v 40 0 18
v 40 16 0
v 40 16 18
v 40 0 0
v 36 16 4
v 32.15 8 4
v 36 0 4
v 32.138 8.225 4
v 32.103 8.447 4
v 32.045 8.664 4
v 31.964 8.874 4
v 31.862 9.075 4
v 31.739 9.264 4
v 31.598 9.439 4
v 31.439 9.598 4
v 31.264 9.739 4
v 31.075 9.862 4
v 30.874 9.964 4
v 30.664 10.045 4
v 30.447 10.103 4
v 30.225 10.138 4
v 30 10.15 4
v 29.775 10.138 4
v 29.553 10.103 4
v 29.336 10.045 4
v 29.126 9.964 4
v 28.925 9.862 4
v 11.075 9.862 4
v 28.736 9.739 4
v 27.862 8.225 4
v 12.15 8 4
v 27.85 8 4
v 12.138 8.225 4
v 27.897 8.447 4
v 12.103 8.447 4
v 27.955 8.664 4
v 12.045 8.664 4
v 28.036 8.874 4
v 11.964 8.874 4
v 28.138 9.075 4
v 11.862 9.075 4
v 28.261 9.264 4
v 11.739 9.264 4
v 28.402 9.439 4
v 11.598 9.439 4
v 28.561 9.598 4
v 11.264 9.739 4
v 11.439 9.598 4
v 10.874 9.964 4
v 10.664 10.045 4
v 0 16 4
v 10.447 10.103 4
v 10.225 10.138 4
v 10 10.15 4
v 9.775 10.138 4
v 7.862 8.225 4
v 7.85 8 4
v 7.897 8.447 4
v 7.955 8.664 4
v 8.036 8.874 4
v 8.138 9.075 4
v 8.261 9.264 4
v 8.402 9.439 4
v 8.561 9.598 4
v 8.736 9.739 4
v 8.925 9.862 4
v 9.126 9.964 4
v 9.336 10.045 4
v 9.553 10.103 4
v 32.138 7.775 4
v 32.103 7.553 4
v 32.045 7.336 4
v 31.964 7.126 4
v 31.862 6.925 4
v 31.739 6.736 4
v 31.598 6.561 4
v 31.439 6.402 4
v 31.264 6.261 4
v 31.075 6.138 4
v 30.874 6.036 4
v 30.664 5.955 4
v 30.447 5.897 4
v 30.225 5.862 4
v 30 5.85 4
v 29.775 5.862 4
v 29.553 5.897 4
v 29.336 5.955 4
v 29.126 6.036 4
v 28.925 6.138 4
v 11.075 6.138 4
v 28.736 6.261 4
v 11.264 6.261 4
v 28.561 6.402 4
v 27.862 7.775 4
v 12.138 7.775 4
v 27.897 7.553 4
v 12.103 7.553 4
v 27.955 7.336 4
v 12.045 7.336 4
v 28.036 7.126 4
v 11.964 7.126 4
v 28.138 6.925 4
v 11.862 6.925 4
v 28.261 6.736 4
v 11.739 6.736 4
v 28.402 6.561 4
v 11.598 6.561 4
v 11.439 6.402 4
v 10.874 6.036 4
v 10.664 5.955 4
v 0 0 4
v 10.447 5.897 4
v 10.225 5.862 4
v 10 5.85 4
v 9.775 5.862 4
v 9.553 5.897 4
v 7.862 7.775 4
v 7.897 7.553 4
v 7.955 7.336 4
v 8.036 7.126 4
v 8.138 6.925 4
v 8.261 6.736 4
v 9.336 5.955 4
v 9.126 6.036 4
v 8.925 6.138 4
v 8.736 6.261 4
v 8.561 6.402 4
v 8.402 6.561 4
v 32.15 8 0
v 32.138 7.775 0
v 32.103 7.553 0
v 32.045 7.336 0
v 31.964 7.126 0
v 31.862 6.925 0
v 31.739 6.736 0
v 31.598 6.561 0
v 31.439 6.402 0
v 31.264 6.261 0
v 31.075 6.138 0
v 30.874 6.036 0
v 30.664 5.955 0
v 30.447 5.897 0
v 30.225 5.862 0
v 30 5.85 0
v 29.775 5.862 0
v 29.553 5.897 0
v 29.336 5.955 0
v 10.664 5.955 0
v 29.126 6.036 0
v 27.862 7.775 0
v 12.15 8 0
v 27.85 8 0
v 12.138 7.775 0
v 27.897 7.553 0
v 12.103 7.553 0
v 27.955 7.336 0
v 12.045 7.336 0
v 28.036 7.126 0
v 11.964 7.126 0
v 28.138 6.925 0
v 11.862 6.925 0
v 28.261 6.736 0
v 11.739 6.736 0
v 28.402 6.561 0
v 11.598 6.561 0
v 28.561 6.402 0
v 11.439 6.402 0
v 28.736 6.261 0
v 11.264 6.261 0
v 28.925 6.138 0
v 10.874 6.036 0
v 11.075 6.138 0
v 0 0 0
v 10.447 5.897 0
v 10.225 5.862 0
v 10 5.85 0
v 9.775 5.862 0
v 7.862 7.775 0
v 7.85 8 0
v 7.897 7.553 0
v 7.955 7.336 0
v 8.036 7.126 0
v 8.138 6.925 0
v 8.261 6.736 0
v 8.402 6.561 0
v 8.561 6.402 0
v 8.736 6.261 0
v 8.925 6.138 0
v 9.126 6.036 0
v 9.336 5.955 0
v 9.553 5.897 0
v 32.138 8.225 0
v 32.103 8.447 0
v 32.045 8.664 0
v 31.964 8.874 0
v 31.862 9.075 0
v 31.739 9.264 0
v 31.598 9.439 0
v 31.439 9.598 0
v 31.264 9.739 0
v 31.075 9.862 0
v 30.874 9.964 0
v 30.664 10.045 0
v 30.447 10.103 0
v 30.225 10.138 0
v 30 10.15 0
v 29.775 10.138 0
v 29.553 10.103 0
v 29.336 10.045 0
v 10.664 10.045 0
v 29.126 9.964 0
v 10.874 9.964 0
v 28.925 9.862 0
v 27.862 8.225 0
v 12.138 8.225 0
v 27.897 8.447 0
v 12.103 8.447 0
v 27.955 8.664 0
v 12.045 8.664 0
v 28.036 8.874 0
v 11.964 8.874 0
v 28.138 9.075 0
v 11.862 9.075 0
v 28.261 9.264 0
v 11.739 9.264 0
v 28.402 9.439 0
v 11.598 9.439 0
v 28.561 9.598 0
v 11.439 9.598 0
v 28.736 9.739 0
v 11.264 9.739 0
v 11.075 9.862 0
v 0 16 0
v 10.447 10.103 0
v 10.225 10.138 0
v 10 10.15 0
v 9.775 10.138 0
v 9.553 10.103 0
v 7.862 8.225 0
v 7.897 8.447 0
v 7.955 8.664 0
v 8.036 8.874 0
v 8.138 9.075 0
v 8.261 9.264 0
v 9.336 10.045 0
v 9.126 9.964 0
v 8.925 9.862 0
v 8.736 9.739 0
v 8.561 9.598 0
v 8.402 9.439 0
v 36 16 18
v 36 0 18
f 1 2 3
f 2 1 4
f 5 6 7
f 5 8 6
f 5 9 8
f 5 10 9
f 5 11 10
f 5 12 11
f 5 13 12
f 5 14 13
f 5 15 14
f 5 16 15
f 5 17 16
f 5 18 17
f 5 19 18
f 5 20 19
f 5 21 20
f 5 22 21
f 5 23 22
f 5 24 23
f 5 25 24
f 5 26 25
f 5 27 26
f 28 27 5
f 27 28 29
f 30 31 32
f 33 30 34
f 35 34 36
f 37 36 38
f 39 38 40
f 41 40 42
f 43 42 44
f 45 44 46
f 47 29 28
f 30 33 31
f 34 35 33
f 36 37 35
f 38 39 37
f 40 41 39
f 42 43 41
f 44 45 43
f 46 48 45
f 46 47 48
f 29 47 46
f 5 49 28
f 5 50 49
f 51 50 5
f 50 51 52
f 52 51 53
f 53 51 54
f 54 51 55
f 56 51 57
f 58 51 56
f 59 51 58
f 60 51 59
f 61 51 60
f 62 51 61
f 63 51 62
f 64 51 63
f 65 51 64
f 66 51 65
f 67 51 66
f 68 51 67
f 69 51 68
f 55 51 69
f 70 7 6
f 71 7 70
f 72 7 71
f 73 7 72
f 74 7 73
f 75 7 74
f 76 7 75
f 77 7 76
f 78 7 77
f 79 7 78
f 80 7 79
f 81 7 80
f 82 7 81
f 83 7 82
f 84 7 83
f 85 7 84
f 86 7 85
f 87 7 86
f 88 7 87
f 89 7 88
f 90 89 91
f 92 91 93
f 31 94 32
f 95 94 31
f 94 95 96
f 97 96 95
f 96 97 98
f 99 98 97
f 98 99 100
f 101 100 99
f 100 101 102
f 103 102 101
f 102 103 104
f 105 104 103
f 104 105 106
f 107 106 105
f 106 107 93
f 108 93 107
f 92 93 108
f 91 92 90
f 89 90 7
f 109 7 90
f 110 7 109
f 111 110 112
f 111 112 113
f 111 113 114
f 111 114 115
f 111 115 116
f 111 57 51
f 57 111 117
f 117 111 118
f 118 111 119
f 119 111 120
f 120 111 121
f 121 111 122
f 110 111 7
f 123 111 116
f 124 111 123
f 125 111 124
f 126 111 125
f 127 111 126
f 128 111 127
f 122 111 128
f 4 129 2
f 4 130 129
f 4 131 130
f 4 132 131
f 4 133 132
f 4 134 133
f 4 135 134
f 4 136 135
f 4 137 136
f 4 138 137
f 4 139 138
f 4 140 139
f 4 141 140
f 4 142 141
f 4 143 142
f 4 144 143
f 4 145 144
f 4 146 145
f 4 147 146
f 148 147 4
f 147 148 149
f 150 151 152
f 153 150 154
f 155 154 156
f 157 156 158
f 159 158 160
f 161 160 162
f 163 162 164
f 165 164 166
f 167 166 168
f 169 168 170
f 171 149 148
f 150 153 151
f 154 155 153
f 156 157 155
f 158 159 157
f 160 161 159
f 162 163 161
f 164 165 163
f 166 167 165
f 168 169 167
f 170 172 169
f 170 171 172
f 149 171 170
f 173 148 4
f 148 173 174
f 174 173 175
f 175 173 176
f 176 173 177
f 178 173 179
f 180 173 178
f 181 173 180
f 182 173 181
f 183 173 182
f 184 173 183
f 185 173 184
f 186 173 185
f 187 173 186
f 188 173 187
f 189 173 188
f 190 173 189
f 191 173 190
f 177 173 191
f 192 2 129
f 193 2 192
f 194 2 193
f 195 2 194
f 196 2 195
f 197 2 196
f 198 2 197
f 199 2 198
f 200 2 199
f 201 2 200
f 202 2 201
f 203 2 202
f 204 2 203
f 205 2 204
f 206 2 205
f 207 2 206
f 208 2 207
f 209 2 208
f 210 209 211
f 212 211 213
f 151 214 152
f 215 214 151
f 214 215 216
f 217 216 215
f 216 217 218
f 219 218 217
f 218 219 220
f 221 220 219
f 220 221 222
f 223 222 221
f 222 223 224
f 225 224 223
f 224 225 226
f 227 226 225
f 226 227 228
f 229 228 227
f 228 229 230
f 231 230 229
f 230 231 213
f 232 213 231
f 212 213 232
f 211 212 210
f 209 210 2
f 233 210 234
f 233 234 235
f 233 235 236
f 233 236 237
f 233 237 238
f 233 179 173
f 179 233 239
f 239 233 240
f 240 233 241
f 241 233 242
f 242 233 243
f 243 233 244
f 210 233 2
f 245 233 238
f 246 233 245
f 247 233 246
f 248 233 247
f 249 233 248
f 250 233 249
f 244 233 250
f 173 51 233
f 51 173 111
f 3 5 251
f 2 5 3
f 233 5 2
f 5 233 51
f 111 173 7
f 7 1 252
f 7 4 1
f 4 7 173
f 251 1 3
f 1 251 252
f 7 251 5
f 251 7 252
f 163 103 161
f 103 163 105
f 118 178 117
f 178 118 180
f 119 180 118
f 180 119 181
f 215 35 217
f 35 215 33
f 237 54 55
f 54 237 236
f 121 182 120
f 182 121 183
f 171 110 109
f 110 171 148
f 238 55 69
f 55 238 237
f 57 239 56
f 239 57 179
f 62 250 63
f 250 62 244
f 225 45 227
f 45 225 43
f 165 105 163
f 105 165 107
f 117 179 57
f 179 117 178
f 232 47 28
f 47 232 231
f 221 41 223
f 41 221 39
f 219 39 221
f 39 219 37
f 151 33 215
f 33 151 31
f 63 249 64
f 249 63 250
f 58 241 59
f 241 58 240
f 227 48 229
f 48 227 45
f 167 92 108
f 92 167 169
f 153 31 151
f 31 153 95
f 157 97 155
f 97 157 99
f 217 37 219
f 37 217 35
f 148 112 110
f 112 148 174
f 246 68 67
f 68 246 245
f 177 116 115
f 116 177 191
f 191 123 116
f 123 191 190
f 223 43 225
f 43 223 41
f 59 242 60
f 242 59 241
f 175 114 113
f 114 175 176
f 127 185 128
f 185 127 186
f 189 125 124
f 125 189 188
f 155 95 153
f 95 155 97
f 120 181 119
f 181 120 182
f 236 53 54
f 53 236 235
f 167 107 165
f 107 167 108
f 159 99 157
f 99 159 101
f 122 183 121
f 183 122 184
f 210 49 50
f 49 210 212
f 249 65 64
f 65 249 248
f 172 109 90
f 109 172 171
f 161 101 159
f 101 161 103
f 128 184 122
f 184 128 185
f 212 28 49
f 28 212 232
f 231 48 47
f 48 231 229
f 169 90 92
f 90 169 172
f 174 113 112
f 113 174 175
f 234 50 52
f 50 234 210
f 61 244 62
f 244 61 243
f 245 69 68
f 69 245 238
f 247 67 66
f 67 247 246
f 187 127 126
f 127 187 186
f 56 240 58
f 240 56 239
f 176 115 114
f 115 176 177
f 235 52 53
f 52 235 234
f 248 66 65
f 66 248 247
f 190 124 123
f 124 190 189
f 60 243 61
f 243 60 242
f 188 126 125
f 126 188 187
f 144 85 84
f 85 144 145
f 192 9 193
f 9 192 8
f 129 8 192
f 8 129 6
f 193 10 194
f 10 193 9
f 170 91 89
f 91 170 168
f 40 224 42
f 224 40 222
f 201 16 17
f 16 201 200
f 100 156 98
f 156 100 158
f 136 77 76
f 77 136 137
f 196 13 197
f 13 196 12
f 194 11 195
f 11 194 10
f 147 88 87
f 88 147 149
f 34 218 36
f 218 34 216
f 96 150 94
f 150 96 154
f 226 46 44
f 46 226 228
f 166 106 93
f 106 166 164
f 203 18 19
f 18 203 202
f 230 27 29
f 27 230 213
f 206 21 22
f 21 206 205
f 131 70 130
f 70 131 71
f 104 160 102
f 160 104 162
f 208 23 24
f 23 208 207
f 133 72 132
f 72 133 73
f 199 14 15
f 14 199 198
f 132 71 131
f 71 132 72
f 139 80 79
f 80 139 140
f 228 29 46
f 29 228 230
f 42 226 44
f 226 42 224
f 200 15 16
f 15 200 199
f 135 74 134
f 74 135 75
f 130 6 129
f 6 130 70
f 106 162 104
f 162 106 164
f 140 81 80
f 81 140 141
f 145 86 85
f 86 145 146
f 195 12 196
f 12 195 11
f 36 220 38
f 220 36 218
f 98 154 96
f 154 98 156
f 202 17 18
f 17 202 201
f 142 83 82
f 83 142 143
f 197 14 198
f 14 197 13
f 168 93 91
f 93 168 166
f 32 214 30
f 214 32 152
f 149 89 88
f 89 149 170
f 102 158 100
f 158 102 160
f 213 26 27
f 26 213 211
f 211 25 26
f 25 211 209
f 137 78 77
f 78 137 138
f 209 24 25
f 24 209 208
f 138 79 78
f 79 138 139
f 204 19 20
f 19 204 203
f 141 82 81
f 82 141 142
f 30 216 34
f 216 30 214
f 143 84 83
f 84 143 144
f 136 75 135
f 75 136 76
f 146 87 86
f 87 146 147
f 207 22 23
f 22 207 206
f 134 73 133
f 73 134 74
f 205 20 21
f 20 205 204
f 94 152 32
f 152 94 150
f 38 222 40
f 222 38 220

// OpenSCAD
// Latch hook bracket.
$fn = 60;
eps = 0.02;
length = 40;
height = 14;
width = 16;
thickness = 4;
difference() { union() { cube([length,width,thickness]); translate([length-thickness,0,thickness]) cube([thickness,width,height]); } for(x=[10,length-10]) translate([x,width/2,-eps]) cylinder(d=4.3,h=thickness+2*eps); }
